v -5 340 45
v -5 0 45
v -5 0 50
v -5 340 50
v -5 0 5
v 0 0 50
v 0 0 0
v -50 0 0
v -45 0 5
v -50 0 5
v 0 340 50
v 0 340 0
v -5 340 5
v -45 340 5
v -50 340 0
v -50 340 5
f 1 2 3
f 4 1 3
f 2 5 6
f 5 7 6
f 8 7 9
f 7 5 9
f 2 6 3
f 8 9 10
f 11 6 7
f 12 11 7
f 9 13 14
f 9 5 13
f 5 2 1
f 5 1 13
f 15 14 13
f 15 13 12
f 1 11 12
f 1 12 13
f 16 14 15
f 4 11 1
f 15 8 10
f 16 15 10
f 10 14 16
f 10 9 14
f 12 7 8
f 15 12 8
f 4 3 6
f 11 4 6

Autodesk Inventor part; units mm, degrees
ref_plane "YZ Plane" through (0, 0, 0) normal (1, 0, 0) x (0, 1, 0)
ref_plane "XZ Plane" through (0, 0, 0) normal (0, 1, 0) x (-1, 0, 0)
ref_plane "XY Plane" through (0, 0, 0) normal (0, 0, 1) x (1, 0, 0)
sketch "Sketch1" plane through (0, 0, 0) normal (0, 1, 0) x (-1, 0, 0)
  line L0 (50, 50) -> (0, 50)
  line L1 (0, 50) -> (0, 0)
  line L2 (0, 0) -> (50, 0)
  line L3 (50, 0) -> (50, 50)
  line L4 (45, 45) -> (5, 45)
  line L5 (5, 45) -> (5, 5)
  line L6 (5, 5) -> (45, 5)
  line L7 (45, 5) -> (45, 45)
  line L8 (45, 5) -> (50, 5)
  line L9 (5, 45) -> (5, 50)
  dimension "d0" = 50
  dimension "d1" = 50
  dimension "d2" = 5
extrude "Extrusion1" add sketch "Sketch1" along normal blind 340 contours L9 L5 L6 L8 L3 L2 L1 L0
properties part number "Ugolok"
